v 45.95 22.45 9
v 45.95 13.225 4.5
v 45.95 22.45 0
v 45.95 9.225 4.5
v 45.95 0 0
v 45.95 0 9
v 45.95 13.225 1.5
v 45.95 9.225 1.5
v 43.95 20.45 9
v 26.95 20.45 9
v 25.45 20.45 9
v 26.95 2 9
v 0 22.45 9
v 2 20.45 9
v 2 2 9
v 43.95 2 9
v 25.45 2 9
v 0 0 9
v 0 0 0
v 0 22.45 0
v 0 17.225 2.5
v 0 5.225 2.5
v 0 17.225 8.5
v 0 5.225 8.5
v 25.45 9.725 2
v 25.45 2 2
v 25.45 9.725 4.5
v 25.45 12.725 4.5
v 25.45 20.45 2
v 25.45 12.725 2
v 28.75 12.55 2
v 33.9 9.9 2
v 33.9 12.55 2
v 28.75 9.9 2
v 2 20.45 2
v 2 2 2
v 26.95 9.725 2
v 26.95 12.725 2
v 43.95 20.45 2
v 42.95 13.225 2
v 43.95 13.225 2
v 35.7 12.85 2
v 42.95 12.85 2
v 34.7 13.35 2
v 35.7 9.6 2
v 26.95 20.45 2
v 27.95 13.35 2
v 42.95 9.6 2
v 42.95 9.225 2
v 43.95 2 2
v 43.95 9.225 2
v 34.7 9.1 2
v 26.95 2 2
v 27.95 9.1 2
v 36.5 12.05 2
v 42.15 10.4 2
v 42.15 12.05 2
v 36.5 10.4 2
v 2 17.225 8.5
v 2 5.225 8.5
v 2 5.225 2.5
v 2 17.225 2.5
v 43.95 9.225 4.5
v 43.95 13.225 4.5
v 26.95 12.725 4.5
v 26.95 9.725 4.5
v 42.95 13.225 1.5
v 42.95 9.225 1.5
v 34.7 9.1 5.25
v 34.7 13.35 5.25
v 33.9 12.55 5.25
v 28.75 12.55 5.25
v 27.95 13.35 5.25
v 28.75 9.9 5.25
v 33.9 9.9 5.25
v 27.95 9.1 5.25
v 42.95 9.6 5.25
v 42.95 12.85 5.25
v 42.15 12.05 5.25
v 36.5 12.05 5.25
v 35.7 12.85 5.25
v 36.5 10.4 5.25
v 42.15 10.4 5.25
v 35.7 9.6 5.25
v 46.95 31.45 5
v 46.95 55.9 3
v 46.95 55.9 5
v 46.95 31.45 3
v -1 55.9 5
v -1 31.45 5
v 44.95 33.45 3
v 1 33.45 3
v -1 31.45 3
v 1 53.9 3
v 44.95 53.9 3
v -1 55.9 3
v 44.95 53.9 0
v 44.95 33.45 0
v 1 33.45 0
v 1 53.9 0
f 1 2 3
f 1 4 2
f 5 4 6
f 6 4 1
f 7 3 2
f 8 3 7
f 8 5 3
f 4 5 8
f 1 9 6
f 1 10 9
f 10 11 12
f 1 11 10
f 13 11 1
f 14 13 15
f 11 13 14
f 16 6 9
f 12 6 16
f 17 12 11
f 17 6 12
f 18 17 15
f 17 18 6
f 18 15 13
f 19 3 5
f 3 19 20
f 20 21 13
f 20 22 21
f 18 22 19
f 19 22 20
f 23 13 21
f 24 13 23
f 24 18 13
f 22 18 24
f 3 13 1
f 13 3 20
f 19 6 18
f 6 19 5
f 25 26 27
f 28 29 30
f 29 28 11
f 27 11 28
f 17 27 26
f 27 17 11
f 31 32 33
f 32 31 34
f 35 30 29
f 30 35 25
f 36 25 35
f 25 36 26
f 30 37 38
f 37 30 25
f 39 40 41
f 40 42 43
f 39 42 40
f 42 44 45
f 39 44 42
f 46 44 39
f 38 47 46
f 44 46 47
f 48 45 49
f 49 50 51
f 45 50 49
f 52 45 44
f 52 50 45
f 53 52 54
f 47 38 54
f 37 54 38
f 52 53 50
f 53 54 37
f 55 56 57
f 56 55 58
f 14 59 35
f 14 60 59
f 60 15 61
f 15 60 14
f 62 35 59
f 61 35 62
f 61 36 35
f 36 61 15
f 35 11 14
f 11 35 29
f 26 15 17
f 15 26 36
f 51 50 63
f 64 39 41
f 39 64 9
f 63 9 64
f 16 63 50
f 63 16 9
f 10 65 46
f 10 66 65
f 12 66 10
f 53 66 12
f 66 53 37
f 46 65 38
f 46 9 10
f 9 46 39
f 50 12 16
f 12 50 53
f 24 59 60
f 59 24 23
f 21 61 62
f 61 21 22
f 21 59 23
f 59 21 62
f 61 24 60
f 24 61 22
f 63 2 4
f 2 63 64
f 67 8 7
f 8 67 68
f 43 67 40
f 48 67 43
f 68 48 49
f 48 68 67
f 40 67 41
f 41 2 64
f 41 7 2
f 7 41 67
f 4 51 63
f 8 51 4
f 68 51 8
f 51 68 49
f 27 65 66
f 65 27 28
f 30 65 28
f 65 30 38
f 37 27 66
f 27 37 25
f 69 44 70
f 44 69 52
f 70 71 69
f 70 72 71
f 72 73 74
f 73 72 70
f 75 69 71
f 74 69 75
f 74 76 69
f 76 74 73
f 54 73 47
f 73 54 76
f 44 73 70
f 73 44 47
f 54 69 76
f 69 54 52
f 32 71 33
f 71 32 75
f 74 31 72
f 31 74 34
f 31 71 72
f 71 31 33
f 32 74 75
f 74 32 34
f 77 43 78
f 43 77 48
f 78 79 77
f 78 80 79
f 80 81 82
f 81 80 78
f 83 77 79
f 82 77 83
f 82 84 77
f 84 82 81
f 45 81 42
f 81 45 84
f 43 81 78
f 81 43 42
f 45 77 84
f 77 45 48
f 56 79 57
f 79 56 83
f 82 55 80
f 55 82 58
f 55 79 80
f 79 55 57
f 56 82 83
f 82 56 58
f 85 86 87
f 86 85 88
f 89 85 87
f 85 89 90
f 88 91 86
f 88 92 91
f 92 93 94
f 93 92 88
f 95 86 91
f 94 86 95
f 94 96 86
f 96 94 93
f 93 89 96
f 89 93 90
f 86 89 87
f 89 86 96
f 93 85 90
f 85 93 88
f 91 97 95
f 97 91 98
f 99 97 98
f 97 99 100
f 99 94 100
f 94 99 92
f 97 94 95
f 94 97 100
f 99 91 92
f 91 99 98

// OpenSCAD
// ============================================================
// Part 1 — ESP32-S3 SuperMini Cradle & Reset Module
// ============================================================
// Two-piece enclosure (base tray + friction-fit lid):
//   - pocket for the SuperMini board
//   - front port cutout for the 20cm Type-C cable's molded collar
//   - internal friction-fit bay for 1x EL817C (DIP-4) + 1x 220R resistor
//   - rear notch to route the 2-pin DuPont wire to motherboard RST header #18
//
// Render:   openscad -o part1_esp32_cradle.3mf part1_esp32_cradle.scad
// Preview:  openscad part1_esp32_cradle.scad
//
// Numbers marked VERIFY ON ARRIVAL are placeholders — the part hasn't been
// calipered yet. Everything downstream is derived from these variables, so
// updating them here is the only edit needed once the real part is in hand.

$fn = 48;

// ---- global clearance ----
tol = 0.25;                    // fit clearance for confirmed dimensions

// ---- ESP32-S3 SuperMini ----
// Confirmed from the candidate listing's dimensioned product photo.
esp32_l = 23.2;
esp32_w = 18.2;
esp32_h = 6;                   // VERIFY ON ARRIVAL — board + USB-C connector + underside stack height

// ---- USB-C cable strain-relief cutout (front face) ----
// Bare plug shell is a fixed 8.4 x 2.56mm (USB-IF spec), but the molded
// overmold/boot around it is NOT standardized. Widened from the original
// 10.5 x 6.5mm brief figure to a safer default.
usb_cutout_w = 12;             // VERIFY ON ARRIVAL — cable overmold width
usb_z_margin = 0.5;            // cutout starts/ends this far from floor/ceiling

// ---- EL817C DIP-4 (standard JEDEC package — confirmed low-risk) ----
el817_l = 6.5;
el817_w = 4.0;
el817_h = 3.0;

// ---- 220 ohm resistor (generic 1/4W axial, through-hole) ----
resistor_l = 7;
resistor_d = 3;

// ---- shell construction ----
wall     = 2;                  // wall / floor thickness
divider  = 1.5;                // wall between ESP32 pocket and component bay
bay_gap  = 1;                  // clearance around each component inside the bay
frame_wt = 0.8;                // wall thickness of each friction-fit component frame

pocket_l = esp32_l + tol;
pocket_w = esp32_w + tol;

bay_l = bay_gap + (el817_l + tol) + bay_gap + (resistor_l + tol) + bay_gap;

cavity_h  = esp32_h + 1;       // headroom above floor for board + wires
shell_h   = wall + cavity_h;   // total side-wall height (open top, lid closes it)
shell_w   = pocket_w + 2*wall;
shell_l   = wall + pocket_l + divider + bay_l + wall;

// ============================================================
module component_frame(l, w, h, wt = frame_wt) {
    // open-top/open-bottom friction ring — component drops in from the top
    // and rests on the tray floor beneath it.
    difference() {
        cube([l, w, h]);
        translate([wt, wt, -1]) cube([l - 2*wt, w - 2*wt, h + 2]);
    }
}

module base_shell() {
    difference() {
        cube([shell_l, shell_w, shell_h]);

        // ESP32 pocket — open through the top
        translate([wall, wall, wall])
            cube([pocket_l, pocket_w, cavity_h + 1]);

        // component bay — open through the top
        translate([wall + pocket_l + divider, wall, wall])
            cube([bay_l, shell_w - 2*wall, cavity_h + 1]);

        // USB-C port cutout, front face (X=0), centered on Y
        translate([-1, (shell_w - usb_cutout_w) / 2, wall + usb_z_margin])
            cube([wall + 2, usb_cutout_w, cavity_h - 2*usb_z_margin]);

        // DuPont wire routing notch, rear face, near the floor
        translate([shell_l - wall - 1, wall + (shell_w - 2*wall)/2 - 2, wall - 0.5])
            cube([wall + 2, 4, 3]);

        // low pass-through gap in the divider (ESP32 GPIO leads -> opto input)
        translate([wall + pocket_l, wall + (shell_w - 2*wall)/2 - 1.5, wall])
            cube([divider, 3, 2.5]);
    }

    // EL817C friction-fit frame
    translate([wall + pocket_l + divider + bay_gap,
               wall + (shell_w - 2*wall - (el817_w + tol)) / 2,
               wall])
        component_frame(el817_l + tol, el817_w + tol, el817_h + tol);

    // resistor friction-fit frame
    translate([wall + pocket_l + divider + bay_gap + (el817_l + tol) + bay_gap,
               wall + (shell_w - 2*wall - (resistor_d + tol)) / 2,
               wall])
        component_frame(resistor_l + tol, resistor_d + tol, resistor_d + tol);
}

module lid() {
    lip = 1;
    lip_h = 3;
    // top plate — overhangs the shell like a cap
    translate([-lip, -lip, lip_h])
        cube([shell_l + 2*lip, shell_w + 2*lip, wall]);
    // friction lip that presses into the shell's open top
    translate([lip, lip, 0])
        cube([shell_l - 2*lip, shell_w - 2*lip, lip_h]);
}

// ---- layout for printing: base + lid side by side ----
base_shell();
translate([0, shell_w + 10, 0]) lid();
